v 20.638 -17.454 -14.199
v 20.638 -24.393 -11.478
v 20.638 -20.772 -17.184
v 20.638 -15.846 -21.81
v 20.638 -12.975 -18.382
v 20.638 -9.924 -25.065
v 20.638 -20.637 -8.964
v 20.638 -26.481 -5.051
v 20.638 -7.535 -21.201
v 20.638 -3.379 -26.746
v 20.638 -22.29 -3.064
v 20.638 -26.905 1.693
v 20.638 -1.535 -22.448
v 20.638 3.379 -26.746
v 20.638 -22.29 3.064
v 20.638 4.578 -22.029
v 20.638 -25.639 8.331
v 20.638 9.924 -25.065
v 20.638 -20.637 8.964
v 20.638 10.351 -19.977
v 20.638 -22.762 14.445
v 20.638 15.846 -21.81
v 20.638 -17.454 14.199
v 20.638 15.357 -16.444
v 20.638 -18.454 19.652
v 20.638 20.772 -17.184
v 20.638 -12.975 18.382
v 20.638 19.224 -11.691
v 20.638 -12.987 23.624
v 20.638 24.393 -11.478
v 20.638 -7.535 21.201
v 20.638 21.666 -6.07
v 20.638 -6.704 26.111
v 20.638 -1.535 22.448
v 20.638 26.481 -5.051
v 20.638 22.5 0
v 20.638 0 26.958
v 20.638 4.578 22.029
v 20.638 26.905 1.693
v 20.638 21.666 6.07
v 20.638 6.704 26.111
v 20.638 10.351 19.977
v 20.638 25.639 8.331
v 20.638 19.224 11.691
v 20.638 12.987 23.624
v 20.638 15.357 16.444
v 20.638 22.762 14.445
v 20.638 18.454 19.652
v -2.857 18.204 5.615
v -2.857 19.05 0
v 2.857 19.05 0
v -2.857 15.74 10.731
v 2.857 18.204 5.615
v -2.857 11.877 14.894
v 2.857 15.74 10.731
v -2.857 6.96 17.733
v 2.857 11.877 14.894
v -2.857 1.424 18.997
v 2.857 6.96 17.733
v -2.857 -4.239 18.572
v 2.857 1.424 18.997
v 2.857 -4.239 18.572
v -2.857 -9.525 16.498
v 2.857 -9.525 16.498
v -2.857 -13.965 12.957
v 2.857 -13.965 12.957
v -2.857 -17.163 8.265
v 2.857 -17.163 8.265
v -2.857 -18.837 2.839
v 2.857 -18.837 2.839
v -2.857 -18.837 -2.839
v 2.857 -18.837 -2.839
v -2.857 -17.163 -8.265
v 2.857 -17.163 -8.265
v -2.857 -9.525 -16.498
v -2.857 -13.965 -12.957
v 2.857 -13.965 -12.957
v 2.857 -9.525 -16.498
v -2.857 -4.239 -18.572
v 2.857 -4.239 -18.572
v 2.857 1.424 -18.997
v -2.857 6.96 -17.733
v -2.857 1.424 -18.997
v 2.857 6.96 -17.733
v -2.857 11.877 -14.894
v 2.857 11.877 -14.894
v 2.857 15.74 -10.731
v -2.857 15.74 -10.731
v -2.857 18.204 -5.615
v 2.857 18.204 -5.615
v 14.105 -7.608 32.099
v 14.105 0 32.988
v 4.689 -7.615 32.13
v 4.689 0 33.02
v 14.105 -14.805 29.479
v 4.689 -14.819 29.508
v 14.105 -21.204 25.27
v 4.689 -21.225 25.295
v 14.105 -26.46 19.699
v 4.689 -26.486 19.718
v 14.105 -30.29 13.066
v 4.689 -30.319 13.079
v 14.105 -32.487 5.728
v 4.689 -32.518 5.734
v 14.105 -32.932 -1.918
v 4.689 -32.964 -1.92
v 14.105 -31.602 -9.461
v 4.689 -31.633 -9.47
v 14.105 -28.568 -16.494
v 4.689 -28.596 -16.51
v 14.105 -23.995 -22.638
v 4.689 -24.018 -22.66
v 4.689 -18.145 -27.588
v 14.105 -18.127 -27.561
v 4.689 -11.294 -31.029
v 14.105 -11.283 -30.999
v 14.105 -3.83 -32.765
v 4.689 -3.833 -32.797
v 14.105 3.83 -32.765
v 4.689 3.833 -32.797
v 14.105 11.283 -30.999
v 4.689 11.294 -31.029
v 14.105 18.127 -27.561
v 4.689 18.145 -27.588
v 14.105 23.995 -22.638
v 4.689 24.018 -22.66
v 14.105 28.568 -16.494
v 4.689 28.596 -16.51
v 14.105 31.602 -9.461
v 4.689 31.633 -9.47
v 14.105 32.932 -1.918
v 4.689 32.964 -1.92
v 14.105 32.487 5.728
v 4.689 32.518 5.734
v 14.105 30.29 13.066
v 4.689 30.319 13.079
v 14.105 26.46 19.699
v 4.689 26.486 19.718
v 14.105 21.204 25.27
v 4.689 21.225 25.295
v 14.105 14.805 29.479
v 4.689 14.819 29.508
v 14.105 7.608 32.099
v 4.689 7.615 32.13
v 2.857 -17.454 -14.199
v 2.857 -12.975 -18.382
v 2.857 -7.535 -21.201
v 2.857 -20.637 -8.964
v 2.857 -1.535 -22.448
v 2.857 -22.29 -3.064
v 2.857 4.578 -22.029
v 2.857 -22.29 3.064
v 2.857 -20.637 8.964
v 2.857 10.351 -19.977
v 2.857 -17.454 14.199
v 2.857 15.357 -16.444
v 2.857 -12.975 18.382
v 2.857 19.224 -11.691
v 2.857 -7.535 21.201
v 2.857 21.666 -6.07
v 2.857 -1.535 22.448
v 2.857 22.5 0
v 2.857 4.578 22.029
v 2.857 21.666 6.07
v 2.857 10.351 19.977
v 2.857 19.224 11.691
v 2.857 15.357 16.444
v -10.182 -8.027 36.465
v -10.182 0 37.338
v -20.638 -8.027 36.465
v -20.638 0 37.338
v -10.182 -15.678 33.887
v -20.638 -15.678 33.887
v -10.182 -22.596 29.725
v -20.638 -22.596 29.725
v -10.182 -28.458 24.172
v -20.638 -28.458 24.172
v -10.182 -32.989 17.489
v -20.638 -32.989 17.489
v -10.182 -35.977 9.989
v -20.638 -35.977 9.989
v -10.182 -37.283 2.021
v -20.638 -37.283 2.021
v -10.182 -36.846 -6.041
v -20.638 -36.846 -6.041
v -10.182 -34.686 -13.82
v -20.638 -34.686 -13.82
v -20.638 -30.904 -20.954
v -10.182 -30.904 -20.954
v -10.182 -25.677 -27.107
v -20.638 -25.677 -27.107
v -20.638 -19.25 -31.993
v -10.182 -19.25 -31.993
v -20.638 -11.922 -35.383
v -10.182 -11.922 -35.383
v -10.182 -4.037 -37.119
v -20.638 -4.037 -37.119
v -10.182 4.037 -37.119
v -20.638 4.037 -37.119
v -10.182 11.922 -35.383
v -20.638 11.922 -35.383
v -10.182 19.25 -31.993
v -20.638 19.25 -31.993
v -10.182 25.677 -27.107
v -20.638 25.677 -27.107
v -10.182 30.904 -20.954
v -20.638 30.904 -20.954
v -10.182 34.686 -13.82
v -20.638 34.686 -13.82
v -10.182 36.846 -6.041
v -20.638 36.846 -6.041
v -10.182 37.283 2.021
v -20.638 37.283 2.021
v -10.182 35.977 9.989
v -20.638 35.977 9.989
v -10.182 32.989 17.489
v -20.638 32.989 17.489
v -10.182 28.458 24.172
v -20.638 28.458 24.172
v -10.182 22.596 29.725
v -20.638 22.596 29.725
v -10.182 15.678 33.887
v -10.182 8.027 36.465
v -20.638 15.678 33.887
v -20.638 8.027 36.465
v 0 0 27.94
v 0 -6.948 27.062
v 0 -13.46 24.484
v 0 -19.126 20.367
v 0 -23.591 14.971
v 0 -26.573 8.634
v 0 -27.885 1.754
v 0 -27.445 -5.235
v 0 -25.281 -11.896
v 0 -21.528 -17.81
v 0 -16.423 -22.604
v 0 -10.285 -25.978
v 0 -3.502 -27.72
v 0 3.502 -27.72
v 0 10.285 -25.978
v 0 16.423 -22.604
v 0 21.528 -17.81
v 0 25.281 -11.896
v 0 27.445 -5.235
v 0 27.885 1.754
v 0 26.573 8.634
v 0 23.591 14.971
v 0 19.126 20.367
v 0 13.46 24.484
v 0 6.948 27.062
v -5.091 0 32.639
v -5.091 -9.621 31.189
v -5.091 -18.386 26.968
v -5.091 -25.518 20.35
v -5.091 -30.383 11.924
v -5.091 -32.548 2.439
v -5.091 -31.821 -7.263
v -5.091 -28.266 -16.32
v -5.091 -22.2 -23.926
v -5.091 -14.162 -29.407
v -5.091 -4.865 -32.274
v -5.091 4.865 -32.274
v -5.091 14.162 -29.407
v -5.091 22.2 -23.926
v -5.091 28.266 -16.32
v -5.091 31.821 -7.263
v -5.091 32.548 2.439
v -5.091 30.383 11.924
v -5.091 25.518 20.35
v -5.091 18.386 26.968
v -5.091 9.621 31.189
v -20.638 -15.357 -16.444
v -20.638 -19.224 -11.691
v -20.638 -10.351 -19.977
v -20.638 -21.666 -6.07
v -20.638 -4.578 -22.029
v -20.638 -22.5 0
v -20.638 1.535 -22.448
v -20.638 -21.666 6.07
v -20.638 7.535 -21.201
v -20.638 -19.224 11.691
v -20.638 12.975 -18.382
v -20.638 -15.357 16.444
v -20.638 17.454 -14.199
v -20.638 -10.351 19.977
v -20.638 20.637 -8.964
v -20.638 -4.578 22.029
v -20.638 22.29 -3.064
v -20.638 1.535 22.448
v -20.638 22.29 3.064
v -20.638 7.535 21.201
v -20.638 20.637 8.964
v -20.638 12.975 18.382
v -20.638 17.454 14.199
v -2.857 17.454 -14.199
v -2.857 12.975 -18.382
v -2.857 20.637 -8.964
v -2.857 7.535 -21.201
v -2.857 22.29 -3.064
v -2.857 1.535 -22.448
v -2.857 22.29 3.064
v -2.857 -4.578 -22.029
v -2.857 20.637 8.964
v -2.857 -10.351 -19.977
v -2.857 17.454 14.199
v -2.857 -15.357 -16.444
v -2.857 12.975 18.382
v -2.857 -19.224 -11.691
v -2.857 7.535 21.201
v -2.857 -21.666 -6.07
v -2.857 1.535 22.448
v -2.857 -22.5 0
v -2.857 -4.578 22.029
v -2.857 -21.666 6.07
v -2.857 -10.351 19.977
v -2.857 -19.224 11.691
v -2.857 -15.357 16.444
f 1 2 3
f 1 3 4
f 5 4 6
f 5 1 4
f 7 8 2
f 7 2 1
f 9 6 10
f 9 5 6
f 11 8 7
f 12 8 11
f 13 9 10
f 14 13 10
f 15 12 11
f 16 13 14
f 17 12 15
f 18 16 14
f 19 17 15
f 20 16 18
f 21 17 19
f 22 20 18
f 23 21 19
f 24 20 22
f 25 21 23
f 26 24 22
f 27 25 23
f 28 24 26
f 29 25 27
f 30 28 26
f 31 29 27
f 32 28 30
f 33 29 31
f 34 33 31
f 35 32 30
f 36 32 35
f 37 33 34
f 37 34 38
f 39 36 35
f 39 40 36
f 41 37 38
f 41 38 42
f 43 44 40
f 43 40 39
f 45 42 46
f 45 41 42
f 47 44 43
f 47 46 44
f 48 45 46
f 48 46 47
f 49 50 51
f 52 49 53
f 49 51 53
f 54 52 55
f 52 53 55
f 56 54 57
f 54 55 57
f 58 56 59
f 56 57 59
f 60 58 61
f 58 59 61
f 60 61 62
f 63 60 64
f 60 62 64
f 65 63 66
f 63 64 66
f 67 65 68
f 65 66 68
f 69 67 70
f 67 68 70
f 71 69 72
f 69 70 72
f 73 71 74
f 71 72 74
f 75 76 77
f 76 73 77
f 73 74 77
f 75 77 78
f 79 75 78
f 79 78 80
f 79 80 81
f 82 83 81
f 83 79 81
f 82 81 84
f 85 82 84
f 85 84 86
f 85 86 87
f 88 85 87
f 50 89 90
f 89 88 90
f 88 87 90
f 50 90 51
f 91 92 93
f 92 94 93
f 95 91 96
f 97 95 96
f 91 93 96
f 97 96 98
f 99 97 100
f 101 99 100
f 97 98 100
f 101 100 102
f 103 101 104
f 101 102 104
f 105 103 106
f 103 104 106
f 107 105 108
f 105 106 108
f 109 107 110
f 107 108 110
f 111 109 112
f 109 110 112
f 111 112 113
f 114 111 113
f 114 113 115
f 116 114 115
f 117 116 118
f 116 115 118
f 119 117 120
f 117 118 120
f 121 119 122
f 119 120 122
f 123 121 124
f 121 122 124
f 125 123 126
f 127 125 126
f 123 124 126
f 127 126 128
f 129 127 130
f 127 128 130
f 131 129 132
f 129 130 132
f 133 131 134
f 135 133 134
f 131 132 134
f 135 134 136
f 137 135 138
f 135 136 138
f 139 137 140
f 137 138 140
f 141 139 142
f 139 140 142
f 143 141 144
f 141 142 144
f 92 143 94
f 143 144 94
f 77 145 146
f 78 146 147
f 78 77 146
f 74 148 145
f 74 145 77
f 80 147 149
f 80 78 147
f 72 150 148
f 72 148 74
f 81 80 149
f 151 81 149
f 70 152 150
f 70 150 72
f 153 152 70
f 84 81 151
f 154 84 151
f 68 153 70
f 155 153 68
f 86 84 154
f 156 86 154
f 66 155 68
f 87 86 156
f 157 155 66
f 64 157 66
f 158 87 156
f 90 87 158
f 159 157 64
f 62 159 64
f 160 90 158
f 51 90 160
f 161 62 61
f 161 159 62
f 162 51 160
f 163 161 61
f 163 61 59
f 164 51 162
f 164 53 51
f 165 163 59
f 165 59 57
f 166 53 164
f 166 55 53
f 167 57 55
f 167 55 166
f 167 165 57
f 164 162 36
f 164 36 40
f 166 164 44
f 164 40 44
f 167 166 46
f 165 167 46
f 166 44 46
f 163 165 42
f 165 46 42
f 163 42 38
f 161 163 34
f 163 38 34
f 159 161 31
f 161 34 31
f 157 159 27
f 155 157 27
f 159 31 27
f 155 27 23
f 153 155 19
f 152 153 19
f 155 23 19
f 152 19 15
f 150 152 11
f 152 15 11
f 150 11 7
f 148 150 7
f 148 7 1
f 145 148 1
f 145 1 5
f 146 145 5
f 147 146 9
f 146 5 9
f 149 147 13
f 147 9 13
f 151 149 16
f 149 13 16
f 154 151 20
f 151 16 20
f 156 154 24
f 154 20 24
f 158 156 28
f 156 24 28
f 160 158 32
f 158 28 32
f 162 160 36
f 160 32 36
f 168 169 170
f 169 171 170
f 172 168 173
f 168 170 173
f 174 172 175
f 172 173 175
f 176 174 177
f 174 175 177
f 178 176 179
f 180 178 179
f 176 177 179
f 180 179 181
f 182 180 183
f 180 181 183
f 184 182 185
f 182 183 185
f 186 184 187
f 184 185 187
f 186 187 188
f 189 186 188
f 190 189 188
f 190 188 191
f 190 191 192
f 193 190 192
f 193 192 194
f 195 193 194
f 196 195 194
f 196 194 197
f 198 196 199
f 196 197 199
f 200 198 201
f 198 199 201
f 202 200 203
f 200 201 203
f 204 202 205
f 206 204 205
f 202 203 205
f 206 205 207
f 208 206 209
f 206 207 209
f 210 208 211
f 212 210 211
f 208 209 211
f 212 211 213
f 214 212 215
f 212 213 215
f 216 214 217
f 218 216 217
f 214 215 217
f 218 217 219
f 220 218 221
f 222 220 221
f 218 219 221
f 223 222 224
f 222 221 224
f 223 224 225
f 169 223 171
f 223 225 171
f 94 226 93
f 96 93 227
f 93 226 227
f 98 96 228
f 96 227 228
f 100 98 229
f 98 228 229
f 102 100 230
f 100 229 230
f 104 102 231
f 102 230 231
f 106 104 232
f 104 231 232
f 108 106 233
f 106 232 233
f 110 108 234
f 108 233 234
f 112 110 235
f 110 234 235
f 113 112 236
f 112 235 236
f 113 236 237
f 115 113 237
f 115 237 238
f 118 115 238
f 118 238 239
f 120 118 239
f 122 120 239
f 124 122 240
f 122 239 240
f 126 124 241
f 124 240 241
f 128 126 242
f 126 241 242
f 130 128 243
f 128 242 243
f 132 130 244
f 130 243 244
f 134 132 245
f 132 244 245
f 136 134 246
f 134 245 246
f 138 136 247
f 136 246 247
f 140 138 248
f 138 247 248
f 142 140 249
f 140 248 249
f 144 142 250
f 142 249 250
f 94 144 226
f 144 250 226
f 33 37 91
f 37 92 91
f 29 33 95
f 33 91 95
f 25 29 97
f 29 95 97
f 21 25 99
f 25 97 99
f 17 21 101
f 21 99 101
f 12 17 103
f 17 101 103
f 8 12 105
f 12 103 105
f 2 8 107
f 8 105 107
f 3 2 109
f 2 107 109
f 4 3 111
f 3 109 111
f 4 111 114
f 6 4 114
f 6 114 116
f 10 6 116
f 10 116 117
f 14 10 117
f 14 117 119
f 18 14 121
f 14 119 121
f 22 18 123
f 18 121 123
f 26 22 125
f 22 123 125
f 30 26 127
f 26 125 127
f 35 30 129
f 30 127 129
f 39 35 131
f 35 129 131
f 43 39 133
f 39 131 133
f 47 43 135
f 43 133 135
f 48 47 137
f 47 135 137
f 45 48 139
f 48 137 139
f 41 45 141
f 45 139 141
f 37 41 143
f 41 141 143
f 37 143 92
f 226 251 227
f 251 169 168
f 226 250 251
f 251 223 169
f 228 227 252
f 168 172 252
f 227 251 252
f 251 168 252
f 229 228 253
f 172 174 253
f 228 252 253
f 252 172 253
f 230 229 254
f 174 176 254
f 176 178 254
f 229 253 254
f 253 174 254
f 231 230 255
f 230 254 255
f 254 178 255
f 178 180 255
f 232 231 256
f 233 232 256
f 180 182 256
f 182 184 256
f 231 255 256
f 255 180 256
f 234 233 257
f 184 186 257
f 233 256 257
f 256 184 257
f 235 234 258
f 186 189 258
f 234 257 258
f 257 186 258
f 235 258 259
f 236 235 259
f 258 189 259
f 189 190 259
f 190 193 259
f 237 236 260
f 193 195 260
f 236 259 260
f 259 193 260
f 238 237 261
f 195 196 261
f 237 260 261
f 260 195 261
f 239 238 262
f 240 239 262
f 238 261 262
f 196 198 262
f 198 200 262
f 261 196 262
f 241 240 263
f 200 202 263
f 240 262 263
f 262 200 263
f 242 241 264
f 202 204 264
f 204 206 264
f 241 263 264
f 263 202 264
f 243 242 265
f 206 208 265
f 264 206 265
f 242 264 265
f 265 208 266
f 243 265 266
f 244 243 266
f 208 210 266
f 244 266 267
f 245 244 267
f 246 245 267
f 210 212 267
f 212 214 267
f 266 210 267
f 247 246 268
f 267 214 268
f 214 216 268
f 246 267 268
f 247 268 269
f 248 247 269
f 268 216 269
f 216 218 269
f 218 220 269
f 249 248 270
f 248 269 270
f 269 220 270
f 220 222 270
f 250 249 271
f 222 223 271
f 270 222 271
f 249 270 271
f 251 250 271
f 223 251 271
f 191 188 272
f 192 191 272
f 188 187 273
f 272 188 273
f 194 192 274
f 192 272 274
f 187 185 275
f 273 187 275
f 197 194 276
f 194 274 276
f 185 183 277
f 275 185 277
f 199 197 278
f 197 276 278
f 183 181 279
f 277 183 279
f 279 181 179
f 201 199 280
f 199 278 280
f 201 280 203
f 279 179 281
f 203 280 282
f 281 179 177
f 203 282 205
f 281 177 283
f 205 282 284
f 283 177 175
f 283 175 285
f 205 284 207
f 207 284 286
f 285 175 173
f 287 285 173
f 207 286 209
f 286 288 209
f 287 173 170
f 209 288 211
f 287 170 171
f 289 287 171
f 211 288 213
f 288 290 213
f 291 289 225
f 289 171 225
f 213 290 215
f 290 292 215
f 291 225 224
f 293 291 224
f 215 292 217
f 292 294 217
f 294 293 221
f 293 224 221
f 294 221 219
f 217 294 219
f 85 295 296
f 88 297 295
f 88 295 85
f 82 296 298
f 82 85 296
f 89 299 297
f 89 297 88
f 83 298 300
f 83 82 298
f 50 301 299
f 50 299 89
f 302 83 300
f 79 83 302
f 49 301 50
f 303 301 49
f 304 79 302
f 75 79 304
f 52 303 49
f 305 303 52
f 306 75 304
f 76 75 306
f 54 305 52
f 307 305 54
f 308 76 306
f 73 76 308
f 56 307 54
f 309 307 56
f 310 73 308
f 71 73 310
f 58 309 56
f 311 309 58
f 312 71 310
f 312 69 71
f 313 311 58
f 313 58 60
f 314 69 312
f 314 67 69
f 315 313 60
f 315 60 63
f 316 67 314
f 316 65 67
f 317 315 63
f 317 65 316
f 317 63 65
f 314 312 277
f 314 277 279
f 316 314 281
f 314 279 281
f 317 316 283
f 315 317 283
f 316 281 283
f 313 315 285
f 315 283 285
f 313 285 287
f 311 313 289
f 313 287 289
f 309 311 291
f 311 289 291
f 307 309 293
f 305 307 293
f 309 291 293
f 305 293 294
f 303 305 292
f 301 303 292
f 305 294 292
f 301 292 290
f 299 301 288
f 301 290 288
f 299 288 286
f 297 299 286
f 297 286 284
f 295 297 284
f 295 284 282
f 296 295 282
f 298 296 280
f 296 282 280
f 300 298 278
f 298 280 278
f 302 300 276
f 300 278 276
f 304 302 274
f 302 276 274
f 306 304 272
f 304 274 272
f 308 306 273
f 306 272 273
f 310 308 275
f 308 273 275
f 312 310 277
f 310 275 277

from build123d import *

# Parameters (mm, degrees)
F3_R      = 25.4
F3_R_2    = 24.8060859666
F4_DEPTH  = 41.275
F5_R      = 19.05
F6_DEPTH  = 41.276
F7_DEPTH  = 41.275
F8_DEPTH  = 41.276
F9_R      = 22.5
F9_R_2    = 19.05
F10_DEPTH = 17.78
F11_R     = 22.5
F11_R_2   = 19.05
F12_DEPTH = 17.78


with BuildPart() as f2:
    # F1 (on Front) → F2 (revolve)
    with BuildSketch(Plane.XZ):
        Polygon((-20.6375, 25.4), (0, 25.4), (20.6375, 25.4), (20.6375, 26.9582736391), (14.1049345586, 32.9880073607), (4.6889767244, 33.02), (0, 27.94), (-10.1817182737, 37.338), (-20.6375, 37.338), align=None)
    revolve(axis=Axis((0, 0, 0), (1, 0, 0)))

    # F3 (on face) → F4 (join, through all)
    with BuildSketch(Plane.YZ.offset(20.6375)):
        Circle(F3_R)
        Circle(F3_R_2, mode=Mode.SUBTRACT)
    extrude(amount=-F4_DEPTH)

    # F5 (on face) → F6 (cut, through all)
    with BuildSketch(Plane.YZ.offset(20.6375)):
        Circle(F5_R)
    extrude(amount=-F6_DEPTH, mode=Mode.SUBTRACT)

    # F3 (on face) → F7 (join, through all)
    with BuildSketch(Plane.YZ.offset(20.6375)):
        Circle(F3_R_2)
    extrude(amount=-F7_DEPTH)

    # F5 (on face) → F8 (cut, through all)
    with BuildSketch(Plane.YZ.offset(20.6375)):
        Circle(F5_R)
    extrude(amount=-F8_DEPTH, mode=Mode.SUBTRACT)

    # F9 (on face) → F10 (cut)
    with BuildSketch(Plane.YZ.offset(20.6375)):
        Circle(F9_R)
        Circle(F9_R_2, mode=Mode.SUBTRACT)
    extrude(amount=-F10_DEPTH, mode=Mode.SUBTRACT)

    # F11 (on face) → F12 (cut)
    with BuildSketch(Plane(origin=(-20.6375, 0, 0), x_dir=(0, -1, 0), z_dir=(-1, 0, 0))):
        Circle(F11_R)
        Circle(F11_R_2, mode=Mode.SUBTRACT)
    extrude(amount=-F12_DEPTH, mode=Mode.SUBTRACT)


solid = f2.part
